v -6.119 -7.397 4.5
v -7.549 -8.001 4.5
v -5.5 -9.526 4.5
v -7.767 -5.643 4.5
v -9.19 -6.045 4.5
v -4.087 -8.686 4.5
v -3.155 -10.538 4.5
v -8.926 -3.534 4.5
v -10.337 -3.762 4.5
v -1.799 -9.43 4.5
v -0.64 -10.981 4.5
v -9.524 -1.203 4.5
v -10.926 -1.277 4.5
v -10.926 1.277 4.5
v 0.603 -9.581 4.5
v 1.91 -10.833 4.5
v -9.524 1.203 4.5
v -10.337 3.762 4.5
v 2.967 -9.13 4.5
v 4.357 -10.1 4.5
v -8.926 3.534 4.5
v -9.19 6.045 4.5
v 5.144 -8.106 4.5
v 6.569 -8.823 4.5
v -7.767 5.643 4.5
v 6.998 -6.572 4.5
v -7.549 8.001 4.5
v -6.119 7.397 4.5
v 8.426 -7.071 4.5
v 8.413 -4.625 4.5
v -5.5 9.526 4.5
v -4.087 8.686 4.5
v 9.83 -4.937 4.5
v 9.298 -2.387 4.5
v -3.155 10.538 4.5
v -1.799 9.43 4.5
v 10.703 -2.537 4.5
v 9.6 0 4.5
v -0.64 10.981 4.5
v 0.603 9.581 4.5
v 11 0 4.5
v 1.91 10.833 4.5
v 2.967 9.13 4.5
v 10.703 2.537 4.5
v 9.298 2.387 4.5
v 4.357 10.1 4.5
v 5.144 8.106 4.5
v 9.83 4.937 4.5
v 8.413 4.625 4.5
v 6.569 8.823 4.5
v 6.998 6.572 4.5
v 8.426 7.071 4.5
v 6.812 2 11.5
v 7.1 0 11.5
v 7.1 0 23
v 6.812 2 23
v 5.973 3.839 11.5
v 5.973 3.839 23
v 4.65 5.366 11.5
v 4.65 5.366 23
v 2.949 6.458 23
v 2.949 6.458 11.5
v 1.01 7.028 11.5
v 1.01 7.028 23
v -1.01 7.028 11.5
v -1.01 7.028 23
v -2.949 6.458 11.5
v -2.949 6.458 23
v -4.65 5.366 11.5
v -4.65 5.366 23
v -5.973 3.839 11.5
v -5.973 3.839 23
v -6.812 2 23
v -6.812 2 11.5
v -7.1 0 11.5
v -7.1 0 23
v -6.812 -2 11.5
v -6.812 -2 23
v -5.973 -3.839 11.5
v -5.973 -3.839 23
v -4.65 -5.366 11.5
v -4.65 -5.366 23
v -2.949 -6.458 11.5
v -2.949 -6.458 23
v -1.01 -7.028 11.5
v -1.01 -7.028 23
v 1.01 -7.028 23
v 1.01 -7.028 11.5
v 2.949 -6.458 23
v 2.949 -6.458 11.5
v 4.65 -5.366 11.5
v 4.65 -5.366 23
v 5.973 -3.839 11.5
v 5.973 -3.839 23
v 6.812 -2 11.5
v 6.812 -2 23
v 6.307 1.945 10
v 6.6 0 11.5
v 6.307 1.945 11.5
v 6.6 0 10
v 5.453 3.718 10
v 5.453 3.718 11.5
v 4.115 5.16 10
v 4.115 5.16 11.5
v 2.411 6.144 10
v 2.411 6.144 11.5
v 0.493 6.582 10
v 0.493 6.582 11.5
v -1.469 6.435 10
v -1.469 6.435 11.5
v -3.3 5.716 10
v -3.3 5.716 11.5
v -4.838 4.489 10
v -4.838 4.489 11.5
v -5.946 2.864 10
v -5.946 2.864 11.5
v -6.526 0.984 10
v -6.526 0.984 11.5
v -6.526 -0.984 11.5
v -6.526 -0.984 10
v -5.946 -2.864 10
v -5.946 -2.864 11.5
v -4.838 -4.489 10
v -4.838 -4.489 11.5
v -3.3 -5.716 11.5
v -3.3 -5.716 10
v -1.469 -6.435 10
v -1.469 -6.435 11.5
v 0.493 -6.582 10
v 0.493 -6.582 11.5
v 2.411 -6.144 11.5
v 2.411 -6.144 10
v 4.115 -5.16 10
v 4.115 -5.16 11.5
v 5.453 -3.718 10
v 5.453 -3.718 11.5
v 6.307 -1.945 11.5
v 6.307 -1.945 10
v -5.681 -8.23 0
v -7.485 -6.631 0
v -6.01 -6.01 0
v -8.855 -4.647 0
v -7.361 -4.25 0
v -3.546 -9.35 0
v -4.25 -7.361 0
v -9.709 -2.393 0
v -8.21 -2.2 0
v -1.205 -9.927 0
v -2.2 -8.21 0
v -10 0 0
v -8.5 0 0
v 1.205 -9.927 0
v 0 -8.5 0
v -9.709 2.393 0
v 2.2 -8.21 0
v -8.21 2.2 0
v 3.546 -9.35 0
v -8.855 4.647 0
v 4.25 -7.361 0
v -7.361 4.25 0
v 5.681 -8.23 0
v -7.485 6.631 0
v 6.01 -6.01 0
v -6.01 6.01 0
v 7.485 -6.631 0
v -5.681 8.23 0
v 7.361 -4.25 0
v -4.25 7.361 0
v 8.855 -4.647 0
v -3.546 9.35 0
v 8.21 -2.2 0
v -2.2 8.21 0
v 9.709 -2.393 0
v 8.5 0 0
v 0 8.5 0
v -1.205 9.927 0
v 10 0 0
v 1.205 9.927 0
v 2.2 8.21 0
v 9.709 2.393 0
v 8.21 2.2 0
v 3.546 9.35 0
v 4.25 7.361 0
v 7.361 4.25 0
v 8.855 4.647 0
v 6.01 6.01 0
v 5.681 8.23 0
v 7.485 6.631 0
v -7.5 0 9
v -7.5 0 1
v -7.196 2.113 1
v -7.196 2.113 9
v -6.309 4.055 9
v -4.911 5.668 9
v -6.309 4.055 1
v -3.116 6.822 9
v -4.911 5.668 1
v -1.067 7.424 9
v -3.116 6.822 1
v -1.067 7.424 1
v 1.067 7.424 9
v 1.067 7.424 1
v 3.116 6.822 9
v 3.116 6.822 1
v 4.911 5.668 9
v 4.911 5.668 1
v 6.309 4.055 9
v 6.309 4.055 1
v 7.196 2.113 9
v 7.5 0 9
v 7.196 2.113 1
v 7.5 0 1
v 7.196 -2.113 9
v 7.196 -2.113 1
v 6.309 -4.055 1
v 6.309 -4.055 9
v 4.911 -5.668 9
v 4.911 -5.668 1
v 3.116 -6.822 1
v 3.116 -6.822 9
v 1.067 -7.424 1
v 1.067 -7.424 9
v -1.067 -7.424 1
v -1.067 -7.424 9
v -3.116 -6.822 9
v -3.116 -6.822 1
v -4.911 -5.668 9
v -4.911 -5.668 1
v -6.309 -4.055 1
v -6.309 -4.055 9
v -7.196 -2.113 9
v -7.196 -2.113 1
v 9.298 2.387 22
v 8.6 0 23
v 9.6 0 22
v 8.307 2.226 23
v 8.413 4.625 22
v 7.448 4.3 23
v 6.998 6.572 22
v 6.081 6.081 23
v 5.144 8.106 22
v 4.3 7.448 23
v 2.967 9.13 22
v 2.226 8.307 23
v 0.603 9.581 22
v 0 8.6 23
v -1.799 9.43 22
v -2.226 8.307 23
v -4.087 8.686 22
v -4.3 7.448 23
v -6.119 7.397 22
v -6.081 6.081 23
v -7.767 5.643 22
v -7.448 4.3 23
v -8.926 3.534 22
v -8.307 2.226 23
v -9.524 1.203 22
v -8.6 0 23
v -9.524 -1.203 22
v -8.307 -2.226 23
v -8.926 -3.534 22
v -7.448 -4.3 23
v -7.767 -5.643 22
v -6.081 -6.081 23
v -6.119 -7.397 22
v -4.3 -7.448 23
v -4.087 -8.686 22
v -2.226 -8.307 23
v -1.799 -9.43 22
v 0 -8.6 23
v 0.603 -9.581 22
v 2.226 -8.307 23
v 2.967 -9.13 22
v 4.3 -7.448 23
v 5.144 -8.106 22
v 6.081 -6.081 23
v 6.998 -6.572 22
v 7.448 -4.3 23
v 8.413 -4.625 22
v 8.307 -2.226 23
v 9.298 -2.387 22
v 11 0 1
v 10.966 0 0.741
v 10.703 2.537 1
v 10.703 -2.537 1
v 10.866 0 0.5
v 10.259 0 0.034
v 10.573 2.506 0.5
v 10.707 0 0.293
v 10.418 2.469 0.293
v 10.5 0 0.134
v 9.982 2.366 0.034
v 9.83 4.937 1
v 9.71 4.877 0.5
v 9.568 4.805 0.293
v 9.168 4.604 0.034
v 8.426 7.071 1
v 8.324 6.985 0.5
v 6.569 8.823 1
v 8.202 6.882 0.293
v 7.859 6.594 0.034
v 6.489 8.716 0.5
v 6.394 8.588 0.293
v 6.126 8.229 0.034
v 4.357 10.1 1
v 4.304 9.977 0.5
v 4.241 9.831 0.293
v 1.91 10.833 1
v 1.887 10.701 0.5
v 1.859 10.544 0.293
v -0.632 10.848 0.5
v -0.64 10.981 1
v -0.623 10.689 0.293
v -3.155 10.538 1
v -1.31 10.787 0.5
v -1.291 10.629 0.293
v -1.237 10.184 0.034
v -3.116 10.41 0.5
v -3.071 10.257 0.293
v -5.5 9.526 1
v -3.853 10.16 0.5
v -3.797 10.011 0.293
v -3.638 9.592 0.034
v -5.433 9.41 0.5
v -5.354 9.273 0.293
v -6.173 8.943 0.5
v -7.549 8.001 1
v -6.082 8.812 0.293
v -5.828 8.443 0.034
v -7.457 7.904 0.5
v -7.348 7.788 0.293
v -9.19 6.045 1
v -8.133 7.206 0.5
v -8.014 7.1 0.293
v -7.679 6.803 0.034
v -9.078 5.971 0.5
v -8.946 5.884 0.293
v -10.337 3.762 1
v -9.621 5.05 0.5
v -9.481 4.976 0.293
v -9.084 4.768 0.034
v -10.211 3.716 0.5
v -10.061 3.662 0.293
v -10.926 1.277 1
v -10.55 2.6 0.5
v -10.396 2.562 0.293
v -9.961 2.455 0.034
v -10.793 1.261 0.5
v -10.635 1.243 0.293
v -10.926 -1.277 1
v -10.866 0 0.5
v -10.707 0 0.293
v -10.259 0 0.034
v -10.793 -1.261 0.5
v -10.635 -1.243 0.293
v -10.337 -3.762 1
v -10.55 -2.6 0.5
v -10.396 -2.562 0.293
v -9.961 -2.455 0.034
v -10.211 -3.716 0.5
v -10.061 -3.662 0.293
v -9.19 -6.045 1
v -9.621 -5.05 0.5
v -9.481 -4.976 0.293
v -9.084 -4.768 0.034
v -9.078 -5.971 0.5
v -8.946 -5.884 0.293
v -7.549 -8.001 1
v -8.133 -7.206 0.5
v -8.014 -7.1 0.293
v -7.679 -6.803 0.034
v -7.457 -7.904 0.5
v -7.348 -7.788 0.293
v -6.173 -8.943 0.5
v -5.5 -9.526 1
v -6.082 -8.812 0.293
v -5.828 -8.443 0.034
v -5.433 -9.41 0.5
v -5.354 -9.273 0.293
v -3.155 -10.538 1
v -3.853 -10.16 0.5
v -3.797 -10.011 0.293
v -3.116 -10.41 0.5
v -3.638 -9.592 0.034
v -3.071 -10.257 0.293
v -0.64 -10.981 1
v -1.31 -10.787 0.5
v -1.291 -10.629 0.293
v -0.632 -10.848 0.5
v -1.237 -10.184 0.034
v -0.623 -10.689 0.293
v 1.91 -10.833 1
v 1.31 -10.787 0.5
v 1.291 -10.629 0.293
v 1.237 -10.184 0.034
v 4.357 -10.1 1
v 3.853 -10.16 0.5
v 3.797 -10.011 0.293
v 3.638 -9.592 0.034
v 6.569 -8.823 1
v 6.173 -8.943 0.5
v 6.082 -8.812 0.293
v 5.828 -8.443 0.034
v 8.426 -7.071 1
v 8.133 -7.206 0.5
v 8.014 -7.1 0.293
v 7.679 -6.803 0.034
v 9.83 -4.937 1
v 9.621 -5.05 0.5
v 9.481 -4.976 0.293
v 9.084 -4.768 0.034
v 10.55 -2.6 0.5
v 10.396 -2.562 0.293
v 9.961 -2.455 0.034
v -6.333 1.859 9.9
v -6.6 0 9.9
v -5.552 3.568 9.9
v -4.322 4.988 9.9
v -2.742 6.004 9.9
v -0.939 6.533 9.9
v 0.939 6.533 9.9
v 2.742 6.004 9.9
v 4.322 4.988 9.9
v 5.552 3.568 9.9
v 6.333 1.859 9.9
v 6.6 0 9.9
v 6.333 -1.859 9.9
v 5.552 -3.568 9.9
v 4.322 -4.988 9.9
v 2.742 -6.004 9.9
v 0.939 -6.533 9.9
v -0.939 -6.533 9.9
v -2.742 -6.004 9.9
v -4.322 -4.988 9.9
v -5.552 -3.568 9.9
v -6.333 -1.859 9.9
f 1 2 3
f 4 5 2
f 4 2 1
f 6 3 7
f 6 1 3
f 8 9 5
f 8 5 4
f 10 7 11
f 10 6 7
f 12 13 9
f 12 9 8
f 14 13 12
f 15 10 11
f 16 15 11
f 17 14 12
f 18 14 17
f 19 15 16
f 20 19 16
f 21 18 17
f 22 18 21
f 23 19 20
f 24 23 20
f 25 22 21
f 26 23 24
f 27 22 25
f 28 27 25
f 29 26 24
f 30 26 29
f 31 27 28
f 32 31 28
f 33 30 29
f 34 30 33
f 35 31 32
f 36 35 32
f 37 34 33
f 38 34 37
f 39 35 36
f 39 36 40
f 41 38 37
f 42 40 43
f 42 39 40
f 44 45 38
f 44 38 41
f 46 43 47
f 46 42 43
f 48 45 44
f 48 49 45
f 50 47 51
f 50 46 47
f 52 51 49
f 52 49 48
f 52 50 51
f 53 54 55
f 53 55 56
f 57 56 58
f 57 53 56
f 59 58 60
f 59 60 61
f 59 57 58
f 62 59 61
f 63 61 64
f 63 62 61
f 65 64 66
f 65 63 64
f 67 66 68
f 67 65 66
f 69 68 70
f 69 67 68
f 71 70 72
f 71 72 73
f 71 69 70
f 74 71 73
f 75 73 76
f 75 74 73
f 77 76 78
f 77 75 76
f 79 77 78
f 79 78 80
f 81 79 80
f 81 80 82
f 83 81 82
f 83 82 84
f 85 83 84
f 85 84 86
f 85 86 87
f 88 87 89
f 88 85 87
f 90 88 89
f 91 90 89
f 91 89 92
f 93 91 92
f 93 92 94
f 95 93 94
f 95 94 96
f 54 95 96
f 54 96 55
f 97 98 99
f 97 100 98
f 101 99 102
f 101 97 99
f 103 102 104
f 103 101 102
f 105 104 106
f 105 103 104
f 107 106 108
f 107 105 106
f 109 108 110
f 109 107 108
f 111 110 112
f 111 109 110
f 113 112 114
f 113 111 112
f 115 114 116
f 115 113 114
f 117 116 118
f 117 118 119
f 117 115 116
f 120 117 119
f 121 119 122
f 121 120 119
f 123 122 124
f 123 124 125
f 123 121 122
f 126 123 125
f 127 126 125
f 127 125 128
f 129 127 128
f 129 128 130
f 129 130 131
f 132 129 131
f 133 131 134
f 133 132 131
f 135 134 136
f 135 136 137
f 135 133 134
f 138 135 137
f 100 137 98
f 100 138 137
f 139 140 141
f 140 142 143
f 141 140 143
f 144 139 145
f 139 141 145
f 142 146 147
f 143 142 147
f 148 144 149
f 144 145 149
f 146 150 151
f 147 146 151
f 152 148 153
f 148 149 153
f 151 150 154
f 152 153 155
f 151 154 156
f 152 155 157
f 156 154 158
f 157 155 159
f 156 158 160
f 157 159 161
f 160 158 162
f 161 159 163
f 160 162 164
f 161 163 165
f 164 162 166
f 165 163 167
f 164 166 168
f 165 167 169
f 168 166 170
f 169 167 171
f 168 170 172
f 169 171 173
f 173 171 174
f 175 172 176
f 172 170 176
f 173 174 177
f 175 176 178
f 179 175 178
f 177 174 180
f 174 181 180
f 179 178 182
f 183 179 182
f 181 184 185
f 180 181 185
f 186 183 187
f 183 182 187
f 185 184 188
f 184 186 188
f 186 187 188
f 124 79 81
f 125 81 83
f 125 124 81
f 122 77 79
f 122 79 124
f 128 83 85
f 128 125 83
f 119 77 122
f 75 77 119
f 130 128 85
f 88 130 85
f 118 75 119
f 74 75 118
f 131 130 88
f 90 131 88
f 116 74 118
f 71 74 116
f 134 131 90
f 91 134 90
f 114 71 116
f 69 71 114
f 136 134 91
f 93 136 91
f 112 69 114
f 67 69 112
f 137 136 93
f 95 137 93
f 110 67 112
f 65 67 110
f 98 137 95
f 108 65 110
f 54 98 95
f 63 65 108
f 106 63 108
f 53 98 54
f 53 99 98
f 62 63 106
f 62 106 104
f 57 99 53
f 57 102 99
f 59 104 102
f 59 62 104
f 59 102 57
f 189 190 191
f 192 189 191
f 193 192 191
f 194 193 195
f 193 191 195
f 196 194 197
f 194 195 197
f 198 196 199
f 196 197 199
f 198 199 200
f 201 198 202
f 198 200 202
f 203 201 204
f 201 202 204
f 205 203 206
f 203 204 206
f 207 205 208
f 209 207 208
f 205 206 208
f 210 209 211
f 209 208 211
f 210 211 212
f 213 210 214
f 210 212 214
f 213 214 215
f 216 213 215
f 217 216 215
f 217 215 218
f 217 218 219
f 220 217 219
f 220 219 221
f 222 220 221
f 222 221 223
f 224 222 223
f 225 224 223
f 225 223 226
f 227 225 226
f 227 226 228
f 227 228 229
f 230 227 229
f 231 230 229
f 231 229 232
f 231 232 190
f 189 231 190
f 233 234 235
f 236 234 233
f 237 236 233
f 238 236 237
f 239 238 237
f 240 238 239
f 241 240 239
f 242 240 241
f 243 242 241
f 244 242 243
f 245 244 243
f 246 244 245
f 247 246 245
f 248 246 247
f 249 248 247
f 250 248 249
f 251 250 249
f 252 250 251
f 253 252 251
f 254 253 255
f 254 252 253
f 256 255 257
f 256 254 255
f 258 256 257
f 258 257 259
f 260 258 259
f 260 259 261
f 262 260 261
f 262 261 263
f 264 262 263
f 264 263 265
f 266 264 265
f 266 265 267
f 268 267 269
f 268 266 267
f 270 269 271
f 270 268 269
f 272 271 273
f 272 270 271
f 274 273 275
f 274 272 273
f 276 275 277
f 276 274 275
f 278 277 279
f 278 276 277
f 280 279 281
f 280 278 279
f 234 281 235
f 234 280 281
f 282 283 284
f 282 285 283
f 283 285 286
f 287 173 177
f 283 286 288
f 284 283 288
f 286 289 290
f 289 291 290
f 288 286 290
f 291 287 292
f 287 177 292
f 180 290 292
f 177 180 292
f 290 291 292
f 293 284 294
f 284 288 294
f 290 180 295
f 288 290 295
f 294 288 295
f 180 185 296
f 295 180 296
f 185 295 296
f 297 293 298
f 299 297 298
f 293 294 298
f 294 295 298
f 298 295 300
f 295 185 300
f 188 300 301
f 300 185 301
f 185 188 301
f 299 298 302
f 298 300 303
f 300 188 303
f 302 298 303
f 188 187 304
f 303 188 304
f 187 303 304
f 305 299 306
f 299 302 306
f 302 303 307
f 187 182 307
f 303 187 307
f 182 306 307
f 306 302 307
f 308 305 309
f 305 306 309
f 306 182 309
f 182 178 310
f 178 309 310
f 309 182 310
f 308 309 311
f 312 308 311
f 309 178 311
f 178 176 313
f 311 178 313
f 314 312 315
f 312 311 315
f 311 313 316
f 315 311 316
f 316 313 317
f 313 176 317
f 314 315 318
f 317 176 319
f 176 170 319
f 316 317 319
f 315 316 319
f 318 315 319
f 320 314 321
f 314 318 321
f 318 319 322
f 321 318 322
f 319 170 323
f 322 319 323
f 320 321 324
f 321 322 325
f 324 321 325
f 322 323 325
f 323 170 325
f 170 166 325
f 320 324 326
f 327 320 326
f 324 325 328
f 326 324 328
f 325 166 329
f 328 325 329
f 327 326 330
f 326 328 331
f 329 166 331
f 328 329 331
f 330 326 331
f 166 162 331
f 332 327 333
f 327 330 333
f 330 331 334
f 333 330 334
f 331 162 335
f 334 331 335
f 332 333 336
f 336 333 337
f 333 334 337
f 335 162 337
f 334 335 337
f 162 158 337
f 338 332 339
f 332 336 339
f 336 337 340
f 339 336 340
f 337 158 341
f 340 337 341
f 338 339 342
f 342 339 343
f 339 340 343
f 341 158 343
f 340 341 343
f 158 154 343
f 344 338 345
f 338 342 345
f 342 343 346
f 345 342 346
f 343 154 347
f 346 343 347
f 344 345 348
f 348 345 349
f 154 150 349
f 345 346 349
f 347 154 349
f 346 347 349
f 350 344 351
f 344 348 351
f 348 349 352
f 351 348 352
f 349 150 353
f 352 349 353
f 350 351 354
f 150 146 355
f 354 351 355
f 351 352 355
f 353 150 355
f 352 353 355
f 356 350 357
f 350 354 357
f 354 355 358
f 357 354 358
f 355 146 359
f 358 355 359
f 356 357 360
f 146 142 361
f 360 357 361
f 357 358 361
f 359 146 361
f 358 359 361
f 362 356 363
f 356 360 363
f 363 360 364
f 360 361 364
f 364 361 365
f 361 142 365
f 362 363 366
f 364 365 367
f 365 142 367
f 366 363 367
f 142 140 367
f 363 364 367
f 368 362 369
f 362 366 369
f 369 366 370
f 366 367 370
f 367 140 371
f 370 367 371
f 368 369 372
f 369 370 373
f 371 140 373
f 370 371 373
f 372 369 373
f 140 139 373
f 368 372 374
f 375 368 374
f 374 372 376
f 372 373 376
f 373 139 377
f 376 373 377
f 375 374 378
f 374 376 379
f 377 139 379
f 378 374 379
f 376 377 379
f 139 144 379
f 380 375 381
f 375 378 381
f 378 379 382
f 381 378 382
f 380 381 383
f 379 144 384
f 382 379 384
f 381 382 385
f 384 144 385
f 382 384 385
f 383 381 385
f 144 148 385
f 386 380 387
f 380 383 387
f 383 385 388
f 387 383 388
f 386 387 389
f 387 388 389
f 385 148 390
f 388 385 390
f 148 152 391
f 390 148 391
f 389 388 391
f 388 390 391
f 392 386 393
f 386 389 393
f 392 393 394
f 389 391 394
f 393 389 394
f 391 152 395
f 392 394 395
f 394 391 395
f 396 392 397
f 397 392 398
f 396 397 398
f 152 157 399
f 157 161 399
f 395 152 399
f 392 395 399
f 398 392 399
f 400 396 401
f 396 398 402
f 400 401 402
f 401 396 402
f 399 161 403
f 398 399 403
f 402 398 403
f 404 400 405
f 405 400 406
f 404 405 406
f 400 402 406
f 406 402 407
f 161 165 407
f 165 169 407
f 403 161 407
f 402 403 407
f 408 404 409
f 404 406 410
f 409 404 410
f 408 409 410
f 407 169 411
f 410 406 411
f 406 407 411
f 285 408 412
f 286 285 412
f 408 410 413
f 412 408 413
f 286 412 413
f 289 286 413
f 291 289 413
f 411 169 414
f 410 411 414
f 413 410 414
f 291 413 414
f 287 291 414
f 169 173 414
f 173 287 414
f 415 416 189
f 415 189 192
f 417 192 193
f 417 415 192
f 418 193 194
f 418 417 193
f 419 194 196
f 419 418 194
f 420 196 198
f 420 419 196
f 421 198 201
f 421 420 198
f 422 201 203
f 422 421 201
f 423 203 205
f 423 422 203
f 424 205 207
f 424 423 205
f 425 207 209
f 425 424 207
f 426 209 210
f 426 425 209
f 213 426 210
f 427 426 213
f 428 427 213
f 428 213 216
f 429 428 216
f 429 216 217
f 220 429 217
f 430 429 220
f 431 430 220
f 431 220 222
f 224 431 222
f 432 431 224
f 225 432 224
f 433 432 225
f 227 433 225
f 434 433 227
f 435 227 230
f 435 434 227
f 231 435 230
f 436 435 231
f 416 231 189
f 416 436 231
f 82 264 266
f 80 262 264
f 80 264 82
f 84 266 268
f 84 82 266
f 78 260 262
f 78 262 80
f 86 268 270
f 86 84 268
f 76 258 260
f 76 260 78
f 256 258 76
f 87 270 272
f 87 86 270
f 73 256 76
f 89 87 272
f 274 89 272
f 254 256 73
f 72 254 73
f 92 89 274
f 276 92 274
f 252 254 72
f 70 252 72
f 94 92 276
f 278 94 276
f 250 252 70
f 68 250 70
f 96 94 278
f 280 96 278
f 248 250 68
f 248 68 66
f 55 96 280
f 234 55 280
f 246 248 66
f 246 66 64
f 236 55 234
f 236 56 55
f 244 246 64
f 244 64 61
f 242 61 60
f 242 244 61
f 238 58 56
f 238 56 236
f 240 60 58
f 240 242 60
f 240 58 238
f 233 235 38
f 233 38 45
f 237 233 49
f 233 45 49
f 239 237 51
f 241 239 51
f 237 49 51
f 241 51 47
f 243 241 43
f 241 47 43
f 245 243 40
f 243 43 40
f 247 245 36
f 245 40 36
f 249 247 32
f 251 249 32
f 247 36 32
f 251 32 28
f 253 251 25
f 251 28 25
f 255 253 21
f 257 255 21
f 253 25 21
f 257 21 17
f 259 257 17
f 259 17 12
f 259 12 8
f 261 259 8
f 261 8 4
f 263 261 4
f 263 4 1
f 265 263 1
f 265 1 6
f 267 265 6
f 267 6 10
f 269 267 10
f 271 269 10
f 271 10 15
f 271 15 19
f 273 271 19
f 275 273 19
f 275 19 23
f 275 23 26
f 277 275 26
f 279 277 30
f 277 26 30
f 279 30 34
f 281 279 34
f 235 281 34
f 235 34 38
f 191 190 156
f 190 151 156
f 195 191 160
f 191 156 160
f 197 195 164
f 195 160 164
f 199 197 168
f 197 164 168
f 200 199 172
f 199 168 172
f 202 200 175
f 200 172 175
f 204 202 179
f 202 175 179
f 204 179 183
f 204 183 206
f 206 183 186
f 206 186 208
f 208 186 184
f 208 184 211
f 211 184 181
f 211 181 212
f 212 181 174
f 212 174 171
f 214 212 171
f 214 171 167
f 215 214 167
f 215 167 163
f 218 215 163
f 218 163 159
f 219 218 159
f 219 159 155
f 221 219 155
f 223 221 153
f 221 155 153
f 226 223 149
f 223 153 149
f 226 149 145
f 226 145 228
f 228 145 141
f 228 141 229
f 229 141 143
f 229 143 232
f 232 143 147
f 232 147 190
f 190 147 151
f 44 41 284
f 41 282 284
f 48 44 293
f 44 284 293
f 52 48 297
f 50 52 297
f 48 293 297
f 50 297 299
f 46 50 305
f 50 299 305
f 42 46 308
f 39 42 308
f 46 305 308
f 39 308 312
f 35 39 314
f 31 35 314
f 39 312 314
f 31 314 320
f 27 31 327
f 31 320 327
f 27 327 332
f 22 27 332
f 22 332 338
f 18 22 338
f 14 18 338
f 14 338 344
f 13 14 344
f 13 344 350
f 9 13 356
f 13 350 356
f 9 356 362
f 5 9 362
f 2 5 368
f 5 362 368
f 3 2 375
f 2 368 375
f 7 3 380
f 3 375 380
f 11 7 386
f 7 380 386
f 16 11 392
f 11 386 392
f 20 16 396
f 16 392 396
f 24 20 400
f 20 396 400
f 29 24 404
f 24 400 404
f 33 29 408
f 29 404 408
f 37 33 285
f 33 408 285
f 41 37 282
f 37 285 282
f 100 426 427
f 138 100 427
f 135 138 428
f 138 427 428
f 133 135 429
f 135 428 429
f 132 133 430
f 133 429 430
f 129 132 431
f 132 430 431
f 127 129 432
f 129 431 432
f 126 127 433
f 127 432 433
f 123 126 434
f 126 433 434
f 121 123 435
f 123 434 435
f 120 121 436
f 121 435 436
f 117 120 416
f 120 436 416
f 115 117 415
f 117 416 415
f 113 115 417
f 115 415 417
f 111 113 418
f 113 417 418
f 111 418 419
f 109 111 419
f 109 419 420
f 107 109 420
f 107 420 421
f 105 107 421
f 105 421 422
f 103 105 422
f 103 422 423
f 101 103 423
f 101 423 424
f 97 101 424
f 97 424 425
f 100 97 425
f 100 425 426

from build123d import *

# Parameters (mm, degrees)
SKETCH_1_R          = 11
SKETCH_1_R_2        = 6.6
EXTRUDE_1_DEPTH     = 3
SKETCH_2_R          = 9.6
SKETCH_2_R_2        = 7.1
EXTRUDE_2_DEPTH     = 20
CHAMFER_1_SIZE      = 1
FILLET_1_R          = 1
SKETCH_3_R          = 11
SKETCH_3_R_2        = 9.6
EXTRUDE_3_DEPTH     = 1.5
SKETCH_4_R          = 7.1
SKETCH_4_R_2        = 6.6
EXTRUDE_4_DEPTH     = 8.5
SKETCH_5_R          = 7.5
CUT_EXTRUDE_1_DEPTH = 10
CHAMFER_2_SIZE      = 1


with BuildPart() as part:
    # 스케치1 → 보스-돌출1 (new body)
    with BuildSketch(Plane.XY):
        Circle(SKETCH_1_R)
        Circle(SKETCH_1_R_2, mode=Mode.SUBTRACT)
    extrude(amount=EXTRUDE_1_DEPTH)

    # 스케치2 → 보스-돌출2 (add)
    with BuildSketch(Plane.XY.offset(3)):
        Circle(SKETCH_2_R)
        Circle(SKETCH_2_R_2, mode=Mode.SUBTRACT)
    extrude(amount=EXTRUDE_2_DEPTH)

    # 모따기1
    chamfer_1_edges = [part.edges().sort_by_distance(p)[0] for p in [
        (-9.6, 0, 23),
    ]]
    chamfer(chamfer_1_edges, length=CHAMFER_1_SIZE)

    # 필렛1
    fillet_1_edges = [part.edges().sort_by_distance(p)[0] for p in [
        (-11, 0, 0),
    ]]
    fillet(fillet_1_edges, radius=FILLET_1_R)

    # 스케치3 → 보스-돌출3 (add)
    with BuildSketch(Plane.XY.offset(3)):
        Circle(SKETCH_3_R)
        Circle(SKETCH_3_R_2, mode=Mode.SUBTRACT)
    extrude(amount=EXTRUDE_3_DEPTH)

    # 스케치4 → 보스-돌출4 (add)
    with BuildSketch(Plane.XY.offset(3)):
        Circle(SKETCH_4_R)
        Circle(SKETCH_4_R_2, mode=Mode.SUBTRACT)
    extrude(amount=EXTRUDE_4_DEPTH)

    # 스케치5 → 컷-돌출1 (cut)
    with BuildSketch(Plane(origin=(0, 0, 0), x_dir=(-1, 0, 0), z_dir=(0, 0, -1))):
        Circle(SKETCH_5_R)
    extrude(amount=-CUT_EXTRUDE_1_DEPTH, mode=Mode.SUBTRACT)

    # 모따기2
    # the kernel refuses this chamfer: 1 mm, written as the material it adds along each edge
    with BuildSketch(Plane(origin=(0, 0, 10), x_dir=(-1, 0, 0), z_dir=(0, -1, 0))) as chamfer_2_piece_1_section:
        Polygon((7.5, CHAMFER_2_SIZE), (7.5 - CHAMFER_2_SIZE, 0), (7.5, 0), align=None)
    chamfer_2_piece_1 = revolve(axis=Axis((0, 0, 10), (0, 0, -1)), mode=Mode.PRIVATE)
    chamfer_2_piece_1 = chamfer_2_piece_1 - Plane(origin=(0, 0, 9.456358799), x_dir=(1, 0, 0), z_dir=(0, 0, -1)) * Cylinder(6.6, 30, mode=Mode.PRIVATE)
    add(chamfer_2_piece_1)
    # the kernel refuses this chamfer: 1 mm, written as the material it takes off along each edge
    with BuildSketch(Plane(origin=(0, 0, 0), x_dir=(-1, 0, 0), z_dir=(0, -1, 0))) as chamfer_2_2_piece_1:
        Polygon((7.5, -CHAMFER_2_SIZE), (7.5 + CHAMFER_2_SIZE, 0), (7.5, 0), align=None)
    revolve(axis=Axis((0, 0, 0), (0, 0, -1)), mode=Mode.SUBTRACT)


solid = part.part
